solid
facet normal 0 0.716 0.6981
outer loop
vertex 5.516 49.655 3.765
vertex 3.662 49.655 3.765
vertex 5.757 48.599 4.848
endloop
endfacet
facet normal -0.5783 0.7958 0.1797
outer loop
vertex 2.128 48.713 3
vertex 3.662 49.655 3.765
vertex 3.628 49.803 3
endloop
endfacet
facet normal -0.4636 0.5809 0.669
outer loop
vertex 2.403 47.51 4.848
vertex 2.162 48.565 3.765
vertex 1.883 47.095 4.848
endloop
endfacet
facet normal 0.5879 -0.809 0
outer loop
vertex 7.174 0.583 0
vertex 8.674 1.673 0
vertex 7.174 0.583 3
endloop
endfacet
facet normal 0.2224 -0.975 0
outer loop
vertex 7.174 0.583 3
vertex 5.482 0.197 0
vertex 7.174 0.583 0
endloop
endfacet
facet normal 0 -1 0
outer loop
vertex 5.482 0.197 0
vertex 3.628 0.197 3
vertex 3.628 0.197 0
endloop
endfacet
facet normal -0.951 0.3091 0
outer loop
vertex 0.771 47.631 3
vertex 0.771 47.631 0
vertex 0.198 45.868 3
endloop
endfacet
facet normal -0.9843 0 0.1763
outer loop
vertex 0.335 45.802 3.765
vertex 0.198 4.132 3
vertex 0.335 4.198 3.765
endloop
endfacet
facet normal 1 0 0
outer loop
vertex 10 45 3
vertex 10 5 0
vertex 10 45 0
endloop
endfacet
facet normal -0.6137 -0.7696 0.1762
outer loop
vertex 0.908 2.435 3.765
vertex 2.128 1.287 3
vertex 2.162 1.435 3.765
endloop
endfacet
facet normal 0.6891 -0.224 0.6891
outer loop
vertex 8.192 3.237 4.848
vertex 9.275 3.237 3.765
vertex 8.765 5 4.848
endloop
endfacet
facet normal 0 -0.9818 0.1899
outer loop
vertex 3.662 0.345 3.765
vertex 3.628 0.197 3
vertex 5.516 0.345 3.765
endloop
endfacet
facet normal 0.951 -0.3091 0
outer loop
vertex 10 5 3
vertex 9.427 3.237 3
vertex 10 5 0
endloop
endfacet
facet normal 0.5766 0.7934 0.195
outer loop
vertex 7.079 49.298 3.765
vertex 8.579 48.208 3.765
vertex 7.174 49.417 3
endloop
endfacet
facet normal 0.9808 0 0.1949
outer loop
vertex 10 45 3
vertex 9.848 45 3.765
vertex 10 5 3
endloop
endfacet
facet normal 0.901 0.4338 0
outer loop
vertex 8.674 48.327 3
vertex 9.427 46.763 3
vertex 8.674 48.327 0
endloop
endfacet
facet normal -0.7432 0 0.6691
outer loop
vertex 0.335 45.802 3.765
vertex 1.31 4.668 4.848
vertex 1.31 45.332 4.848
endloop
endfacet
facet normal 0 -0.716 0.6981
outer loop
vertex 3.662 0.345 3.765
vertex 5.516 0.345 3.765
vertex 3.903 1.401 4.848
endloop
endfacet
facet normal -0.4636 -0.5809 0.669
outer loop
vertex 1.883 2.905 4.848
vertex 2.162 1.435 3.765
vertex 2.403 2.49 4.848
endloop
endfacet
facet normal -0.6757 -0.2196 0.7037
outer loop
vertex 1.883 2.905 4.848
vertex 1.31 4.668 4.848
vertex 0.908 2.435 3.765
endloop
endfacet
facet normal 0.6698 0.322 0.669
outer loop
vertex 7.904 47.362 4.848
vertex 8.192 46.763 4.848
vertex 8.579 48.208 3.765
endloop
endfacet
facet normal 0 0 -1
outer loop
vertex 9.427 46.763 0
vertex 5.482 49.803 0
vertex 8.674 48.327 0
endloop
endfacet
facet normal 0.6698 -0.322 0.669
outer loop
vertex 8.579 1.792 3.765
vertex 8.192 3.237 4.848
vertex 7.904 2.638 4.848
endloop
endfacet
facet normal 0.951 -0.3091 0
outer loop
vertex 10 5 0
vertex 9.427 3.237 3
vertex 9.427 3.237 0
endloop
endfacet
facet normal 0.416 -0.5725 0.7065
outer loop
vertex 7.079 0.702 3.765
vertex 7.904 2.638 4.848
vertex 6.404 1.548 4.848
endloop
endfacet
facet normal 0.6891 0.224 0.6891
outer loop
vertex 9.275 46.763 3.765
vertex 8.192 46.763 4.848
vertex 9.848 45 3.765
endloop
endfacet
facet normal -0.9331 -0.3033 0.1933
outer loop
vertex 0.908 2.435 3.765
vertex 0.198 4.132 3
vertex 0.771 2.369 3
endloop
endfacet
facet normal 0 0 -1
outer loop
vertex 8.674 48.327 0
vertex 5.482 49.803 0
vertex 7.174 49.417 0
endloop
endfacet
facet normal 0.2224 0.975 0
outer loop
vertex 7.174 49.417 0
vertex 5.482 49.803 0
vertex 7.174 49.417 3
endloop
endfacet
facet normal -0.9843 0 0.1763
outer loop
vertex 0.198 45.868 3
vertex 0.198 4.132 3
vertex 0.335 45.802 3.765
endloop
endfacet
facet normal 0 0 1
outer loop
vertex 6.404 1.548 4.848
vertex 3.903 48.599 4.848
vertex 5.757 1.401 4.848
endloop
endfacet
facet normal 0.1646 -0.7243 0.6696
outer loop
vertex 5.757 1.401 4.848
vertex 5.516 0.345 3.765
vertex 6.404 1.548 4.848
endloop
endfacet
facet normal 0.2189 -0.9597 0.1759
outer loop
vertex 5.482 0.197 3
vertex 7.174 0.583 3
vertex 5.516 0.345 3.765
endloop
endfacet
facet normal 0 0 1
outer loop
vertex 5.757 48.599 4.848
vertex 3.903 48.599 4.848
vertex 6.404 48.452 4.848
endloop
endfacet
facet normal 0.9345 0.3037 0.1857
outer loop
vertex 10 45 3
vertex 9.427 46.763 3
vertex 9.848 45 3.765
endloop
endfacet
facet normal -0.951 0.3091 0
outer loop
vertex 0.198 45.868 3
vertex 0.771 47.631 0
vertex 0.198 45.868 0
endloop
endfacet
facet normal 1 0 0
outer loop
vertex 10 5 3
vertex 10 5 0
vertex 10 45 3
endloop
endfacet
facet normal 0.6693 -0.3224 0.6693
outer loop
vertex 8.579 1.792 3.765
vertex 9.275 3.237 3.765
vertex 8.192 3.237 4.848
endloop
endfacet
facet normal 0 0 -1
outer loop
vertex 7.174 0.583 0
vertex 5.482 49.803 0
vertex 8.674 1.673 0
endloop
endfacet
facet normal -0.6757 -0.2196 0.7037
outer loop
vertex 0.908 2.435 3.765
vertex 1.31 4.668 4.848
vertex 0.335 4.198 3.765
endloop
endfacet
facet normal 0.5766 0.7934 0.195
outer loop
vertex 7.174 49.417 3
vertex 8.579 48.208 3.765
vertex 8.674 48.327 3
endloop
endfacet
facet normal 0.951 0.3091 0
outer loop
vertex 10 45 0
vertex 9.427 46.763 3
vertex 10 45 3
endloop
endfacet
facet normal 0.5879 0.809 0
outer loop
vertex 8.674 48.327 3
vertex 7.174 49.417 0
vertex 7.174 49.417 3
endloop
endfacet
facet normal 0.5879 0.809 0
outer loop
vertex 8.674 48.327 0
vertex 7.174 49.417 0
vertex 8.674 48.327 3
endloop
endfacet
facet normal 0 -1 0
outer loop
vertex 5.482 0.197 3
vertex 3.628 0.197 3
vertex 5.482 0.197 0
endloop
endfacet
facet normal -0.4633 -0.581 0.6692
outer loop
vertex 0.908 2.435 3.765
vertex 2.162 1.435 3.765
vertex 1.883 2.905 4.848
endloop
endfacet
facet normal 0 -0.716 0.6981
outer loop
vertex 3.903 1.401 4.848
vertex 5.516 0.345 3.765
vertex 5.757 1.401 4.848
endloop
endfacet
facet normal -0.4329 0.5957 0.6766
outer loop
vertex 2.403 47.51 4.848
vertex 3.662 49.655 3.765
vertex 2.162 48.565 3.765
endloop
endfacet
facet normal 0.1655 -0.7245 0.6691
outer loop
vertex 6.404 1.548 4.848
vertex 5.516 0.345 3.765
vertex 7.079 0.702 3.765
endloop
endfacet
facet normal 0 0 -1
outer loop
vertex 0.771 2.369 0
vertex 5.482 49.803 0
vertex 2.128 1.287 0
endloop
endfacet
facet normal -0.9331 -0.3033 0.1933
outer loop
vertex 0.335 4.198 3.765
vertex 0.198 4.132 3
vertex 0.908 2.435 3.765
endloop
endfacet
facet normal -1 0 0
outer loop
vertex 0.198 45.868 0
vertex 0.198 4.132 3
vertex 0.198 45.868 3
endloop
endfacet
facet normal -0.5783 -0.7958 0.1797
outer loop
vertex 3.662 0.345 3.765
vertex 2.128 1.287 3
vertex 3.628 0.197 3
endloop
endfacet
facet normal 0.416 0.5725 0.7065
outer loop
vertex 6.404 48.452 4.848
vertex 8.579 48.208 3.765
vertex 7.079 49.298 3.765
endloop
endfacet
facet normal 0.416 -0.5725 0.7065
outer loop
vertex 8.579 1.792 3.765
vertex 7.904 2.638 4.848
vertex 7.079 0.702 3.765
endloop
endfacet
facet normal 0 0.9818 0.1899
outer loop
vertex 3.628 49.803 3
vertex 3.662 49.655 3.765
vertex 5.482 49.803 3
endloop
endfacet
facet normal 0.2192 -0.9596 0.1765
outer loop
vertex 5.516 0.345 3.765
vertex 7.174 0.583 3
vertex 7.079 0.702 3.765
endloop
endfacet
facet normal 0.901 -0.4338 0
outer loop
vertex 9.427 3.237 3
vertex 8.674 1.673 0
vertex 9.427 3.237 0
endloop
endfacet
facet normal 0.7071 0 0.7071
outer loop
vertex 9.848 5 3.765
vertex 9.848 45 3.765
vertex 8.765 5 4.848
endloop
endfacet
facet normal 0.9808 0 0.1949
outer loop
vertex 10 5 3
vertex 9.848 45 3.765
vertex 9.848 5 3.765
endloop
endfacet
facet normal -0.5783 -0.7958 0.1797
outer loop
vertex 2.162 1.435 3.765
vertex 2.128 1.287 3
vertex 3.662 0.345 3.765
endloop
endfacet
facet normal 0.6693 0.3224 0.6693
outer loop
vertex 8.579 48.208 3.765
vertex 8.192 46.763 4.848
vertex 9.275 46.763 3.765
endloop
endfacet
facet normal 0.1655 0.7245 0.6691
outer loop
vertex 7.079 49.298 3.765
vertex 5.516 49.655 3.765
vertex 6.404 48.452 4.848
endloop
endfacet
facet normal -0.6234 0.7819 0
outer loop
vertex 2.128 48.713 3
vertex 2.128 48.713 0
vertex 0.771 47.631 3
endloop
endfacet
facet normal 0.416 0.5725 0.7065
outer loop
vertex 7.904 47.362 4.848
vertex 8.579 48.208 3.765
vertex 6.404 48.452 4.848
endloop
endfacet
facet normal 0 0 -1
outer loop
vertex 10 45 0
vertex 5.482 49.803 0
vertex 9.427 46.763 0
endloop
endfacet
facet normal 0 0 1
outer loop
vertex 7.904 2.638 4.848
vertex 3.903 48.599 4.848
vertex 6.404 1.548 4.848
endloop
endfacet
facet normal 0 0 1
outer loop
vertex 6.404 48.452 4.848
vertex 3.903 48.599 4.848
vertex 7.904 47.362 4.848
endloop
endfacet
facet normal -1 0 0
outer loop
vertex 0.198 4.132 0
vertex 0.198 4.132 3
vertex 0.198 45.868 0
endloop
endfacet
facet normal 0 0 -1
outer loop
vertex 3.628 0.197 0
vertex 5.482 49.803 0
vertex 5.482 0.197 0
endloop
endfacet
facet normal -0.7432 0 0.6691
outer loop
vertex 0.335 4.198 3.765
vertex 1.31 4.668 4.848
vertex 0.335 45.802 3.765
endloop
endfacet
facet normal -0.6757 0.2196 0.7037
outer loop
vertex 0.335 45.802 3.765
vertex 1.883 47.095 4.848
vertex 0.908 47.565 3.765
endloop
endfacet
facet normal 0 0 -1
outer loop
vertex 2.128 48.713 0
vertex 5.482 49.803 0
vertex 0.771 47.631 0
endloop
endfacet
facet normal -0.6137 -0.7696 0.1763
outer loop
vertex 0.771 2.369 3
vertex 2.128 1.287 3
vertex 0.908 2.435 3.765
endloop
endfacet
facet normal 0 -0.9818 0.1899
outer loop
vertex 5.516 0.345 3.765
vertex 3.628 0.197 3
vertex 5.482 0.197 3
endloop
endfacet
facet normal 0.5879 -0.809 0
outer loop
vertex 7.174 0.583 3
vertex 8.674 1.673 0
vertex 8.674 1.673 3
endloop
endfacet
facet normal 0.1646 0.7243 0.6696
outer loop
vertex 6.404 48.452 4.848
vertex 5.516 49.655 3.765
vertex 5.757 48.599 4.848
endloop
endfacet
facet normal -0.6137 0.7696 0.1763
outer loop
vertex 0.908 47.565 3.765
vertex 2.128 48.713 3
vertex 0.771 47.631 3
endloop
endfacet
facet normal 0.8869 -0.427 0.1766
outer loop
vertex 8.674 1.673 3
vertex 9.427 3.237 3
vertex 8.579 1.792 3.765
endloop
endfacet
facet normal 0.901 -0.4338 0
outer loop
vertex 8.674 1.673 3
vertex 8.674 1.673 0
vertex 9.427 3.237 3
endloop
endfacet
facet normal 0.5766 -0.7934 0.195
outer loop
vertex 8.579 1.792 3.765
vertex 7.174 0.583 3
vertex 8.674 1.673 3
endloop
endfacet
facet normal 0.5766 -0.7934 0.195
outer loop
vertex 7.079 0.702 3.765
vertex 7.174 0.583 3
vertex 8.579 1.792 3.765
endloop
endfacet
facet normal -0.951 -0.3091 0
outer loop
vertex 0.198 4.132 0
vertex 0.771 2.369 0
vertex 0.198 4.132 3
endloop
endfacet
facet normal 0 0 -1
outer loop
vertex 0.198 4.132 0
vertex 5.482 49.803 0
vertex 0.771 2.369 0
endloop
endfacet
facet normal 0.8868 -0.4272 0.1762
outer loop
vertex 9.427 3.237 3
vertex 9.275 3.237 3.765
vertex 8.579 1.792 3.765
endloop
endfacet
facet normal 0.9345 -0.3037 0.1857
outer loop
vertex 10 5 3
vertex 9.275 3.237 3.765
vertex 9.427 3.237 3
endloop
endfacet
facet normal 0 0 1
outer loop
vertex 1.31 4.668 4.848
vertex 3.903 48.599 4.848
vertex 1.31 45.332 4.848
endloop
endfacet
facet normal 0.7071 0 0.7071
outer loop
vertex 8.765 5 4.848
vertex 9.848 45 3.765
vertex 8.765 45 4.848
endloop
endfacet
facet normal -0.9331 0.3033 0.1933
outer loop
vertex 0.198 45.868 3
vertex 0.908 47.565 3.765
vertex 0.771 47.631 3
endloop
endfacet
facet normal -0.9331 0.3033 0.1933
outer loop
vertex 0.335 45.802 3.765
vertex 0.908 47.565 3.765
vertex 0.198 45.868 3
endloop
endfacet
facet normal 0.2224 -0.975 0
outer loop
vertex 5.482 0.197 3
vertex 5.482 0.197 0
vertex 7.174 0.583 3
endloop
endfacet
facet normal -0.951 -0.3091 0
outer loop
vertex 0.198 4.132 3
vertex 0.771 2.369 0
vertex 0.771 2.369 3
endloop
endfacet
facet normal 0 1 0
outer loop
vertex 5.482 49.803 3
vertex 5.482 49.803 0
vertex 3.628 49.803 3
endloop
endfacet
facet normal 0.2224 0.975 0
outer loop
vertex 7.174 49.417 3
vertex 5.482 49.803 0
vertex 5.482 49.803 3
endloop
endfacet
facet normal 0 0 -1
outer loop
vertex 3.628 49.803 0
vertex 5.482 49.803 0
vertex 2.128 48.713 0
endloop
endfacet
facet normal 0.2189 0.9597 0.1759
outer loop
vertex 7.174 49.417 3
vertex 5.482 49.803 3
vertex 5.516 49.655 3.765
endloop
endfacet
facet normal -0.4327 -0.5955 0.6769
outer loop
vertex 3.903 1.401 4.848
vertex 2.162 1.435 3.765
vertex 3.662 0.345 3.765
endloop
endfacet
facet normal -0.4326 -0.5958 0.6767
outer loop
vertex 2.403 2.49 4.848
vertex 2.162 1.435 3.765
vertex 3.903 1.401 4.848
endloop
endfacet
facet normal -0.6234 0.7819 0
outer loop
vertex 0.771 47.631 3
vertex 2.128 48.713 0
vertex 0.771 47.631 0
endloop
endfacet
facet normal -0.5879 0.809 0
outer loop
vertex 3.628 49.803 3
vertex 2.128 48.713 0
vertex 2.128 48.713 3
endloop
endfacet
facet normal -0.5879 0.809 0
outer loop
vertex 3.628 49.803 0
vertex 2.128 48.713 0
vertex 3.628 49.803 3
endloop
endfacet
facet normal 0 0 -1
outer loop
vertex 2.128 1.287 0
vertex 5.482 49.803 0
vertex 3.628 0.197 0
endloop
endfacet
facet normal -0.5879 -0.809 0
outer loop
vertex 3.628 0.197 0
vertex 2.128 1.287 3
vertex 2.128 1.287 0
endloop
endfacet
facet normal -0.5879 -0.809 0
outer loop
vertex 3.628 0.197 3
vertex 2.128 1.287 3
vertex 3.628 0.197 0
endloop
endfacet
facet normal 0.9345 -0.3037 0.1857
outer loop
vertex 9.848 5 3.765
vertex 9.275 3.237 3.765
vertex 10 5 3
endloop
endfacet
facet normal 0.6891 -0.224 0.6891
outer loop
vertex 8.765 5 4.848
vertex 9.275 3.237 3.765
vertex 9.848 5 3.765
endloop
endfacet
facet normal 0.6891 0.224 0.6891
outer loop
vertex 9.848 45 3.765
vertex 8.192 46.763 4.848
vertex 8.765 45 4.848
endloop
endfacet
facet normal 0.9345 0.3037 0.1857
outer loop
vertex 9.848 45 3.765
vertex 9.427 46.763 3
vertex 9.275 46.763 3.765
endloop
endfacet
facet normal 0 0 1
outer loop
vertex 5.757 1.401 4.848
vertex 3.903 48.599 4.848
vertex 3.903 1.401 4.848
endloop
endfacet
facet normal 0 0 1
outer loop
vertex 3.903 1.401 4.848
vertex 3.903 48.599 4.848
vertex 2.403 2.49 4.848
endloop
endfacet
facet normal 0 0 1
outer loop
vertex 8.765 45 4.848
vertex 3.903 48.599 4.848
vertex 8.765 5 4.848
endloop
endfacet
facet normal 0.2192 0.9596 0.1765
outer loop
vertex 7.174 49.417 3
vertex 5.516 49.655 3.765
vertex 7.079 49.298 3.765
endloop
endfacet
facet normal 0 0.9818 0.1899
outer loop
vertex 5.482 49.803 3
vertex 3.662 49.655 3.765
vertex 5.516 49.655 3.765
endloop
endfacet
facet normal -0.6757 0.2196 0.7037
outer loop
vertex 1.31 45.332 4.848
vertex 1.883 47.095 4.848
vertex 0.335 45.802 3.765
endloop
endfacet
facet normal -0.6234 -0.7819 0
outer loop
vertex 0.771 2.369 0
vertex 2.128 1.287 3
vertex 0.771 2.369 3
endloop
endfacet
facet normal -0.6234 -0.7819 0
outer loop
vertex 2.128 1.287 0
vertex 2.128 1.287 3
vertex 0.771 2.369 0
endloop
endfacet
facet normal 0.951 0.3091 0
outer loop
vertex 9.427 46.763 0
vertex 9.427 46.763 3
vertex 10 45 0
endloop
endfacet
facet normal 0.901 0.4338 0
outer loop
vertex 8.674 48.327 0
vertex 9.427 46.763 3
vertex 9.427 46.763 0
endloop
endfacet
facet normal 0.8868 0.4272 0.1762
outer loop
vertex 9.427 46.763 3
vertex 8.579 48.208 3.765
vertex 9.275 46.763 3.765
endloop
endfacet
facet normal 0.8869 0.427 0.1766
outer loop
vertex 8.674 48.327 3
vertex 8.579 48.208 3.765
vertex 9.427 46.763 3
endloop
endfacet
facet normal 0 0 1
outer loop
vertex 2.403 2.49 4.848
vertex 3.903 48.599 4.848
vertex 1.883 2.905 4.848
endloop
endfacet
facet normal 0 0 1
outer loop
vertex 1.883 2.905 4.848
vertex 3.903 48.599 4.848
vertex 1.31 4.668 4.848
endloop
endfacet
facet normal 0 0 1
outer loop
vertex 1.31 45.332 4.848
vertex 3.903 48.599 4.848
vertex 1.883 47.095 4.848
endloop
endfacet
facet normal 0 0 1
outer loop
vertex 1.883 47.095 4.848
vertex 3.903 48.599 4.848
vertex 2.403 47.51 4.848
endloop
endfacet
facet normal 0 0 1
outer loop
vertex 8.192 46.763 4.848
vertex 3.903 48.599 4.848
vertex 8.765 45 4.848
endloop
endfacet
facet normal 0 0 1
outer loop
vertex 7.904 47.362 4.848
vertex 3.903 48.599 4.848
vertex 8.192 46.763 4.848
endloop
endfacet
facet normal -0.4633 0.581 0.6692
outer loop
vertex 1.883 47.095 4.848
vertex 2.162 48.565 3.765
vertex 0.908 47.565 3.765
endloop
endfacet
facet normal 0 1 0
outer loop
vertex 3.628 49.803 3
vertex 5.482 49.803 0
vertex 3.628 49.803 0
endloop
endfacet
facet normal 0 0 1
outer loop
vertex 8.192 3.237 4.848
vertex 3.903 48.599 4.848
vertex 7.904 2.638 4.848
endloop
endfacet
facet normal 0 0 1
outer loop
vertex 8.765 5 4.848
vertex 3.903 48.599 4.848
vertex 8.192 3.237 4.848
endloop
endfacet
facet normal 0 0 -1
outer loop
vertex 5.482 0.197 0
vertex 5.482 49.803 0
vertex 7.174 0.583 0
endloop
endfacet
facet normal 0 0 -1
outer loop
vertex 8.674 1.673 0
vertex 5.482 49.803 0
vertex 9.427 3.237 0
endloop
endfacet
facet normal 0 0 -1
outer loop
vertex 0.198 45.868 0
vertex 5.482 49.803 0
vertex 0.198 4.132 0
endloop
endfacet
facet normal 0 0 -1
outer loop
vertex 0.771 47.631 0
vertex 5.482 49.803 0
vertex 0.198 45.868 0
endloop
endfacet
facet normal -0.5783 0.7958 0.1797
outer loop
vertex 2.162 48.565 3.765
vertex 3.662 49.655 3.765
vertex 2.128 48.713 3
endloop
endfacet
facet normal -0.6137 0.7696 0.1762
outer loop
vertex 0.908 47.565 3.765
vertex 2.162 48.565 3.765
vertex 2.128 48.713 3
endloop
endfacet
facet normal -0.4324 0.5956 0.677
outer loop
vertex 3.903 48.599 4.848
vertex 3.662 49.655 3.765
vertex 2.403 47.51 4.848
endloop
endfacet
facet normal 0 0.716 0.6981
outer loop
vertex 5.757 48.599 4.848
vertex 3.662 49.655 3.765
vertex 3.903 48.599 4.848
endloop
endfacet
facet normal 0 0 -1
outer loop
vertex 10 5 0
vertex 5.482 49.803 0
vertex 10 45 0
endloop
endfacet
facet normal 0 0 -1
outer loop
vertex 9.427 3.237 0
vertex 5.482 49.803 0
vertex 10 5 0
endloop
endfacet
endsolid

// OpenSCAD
// file: lib.scad
/**
 * Basic keychain shape; Consists of an oblong cylinder
 * that is rounded on the top edge.
 * @param size x,y,z matrix of the size of the keychain
 * @param r radius of top edge
 */
module keychain_blank(size=[10,50,5], r=2, $fn=16) {
	hull() {
		translate([size[0]*.5,size[0]*.5,0]) rounded_cylinder(r1=size[0]/2, r2=r, h=size[2], $fn=$fn);
		translate([size[0]*.5, (size[0]*-.5+size[1]), 0]) rounded_cylinder(r1=size[0]/2, r2=r, h=size[2], $fn=$fn);
	}
}

/**
 * Cylinder that is rounded on one end
 * @param r1 radius of cylinder
 * @param r2 radius applied to top edge
 * @param h overall height of cylinder
 */
module rounded_cylinder(r1, r2, h, $fn) {
	minkowski() {
		cylinder(r=r1-r2, h=.0001, $fn=$fn);
   	bullet(r=r2, h=h-.0001, $fn=$fn);
	}
}

/**
 * Simple bullet shape.
 * Consists of a cylinder with a hemisphere on top
 */
module bullet(r, h) {
	difference() {
		union() {
			cylinder(r=r, h=h-r);
			translate([0,0,h-r]) sphere(r=r);
   	}
			translate([0,0,-r]) cylinder(r=r, h=r);
		}
}
// main file
include <lib.scad>;

keychain_blank();
//rounded_cylinder(r1=10, r2=3, h=5, $fn=16);
